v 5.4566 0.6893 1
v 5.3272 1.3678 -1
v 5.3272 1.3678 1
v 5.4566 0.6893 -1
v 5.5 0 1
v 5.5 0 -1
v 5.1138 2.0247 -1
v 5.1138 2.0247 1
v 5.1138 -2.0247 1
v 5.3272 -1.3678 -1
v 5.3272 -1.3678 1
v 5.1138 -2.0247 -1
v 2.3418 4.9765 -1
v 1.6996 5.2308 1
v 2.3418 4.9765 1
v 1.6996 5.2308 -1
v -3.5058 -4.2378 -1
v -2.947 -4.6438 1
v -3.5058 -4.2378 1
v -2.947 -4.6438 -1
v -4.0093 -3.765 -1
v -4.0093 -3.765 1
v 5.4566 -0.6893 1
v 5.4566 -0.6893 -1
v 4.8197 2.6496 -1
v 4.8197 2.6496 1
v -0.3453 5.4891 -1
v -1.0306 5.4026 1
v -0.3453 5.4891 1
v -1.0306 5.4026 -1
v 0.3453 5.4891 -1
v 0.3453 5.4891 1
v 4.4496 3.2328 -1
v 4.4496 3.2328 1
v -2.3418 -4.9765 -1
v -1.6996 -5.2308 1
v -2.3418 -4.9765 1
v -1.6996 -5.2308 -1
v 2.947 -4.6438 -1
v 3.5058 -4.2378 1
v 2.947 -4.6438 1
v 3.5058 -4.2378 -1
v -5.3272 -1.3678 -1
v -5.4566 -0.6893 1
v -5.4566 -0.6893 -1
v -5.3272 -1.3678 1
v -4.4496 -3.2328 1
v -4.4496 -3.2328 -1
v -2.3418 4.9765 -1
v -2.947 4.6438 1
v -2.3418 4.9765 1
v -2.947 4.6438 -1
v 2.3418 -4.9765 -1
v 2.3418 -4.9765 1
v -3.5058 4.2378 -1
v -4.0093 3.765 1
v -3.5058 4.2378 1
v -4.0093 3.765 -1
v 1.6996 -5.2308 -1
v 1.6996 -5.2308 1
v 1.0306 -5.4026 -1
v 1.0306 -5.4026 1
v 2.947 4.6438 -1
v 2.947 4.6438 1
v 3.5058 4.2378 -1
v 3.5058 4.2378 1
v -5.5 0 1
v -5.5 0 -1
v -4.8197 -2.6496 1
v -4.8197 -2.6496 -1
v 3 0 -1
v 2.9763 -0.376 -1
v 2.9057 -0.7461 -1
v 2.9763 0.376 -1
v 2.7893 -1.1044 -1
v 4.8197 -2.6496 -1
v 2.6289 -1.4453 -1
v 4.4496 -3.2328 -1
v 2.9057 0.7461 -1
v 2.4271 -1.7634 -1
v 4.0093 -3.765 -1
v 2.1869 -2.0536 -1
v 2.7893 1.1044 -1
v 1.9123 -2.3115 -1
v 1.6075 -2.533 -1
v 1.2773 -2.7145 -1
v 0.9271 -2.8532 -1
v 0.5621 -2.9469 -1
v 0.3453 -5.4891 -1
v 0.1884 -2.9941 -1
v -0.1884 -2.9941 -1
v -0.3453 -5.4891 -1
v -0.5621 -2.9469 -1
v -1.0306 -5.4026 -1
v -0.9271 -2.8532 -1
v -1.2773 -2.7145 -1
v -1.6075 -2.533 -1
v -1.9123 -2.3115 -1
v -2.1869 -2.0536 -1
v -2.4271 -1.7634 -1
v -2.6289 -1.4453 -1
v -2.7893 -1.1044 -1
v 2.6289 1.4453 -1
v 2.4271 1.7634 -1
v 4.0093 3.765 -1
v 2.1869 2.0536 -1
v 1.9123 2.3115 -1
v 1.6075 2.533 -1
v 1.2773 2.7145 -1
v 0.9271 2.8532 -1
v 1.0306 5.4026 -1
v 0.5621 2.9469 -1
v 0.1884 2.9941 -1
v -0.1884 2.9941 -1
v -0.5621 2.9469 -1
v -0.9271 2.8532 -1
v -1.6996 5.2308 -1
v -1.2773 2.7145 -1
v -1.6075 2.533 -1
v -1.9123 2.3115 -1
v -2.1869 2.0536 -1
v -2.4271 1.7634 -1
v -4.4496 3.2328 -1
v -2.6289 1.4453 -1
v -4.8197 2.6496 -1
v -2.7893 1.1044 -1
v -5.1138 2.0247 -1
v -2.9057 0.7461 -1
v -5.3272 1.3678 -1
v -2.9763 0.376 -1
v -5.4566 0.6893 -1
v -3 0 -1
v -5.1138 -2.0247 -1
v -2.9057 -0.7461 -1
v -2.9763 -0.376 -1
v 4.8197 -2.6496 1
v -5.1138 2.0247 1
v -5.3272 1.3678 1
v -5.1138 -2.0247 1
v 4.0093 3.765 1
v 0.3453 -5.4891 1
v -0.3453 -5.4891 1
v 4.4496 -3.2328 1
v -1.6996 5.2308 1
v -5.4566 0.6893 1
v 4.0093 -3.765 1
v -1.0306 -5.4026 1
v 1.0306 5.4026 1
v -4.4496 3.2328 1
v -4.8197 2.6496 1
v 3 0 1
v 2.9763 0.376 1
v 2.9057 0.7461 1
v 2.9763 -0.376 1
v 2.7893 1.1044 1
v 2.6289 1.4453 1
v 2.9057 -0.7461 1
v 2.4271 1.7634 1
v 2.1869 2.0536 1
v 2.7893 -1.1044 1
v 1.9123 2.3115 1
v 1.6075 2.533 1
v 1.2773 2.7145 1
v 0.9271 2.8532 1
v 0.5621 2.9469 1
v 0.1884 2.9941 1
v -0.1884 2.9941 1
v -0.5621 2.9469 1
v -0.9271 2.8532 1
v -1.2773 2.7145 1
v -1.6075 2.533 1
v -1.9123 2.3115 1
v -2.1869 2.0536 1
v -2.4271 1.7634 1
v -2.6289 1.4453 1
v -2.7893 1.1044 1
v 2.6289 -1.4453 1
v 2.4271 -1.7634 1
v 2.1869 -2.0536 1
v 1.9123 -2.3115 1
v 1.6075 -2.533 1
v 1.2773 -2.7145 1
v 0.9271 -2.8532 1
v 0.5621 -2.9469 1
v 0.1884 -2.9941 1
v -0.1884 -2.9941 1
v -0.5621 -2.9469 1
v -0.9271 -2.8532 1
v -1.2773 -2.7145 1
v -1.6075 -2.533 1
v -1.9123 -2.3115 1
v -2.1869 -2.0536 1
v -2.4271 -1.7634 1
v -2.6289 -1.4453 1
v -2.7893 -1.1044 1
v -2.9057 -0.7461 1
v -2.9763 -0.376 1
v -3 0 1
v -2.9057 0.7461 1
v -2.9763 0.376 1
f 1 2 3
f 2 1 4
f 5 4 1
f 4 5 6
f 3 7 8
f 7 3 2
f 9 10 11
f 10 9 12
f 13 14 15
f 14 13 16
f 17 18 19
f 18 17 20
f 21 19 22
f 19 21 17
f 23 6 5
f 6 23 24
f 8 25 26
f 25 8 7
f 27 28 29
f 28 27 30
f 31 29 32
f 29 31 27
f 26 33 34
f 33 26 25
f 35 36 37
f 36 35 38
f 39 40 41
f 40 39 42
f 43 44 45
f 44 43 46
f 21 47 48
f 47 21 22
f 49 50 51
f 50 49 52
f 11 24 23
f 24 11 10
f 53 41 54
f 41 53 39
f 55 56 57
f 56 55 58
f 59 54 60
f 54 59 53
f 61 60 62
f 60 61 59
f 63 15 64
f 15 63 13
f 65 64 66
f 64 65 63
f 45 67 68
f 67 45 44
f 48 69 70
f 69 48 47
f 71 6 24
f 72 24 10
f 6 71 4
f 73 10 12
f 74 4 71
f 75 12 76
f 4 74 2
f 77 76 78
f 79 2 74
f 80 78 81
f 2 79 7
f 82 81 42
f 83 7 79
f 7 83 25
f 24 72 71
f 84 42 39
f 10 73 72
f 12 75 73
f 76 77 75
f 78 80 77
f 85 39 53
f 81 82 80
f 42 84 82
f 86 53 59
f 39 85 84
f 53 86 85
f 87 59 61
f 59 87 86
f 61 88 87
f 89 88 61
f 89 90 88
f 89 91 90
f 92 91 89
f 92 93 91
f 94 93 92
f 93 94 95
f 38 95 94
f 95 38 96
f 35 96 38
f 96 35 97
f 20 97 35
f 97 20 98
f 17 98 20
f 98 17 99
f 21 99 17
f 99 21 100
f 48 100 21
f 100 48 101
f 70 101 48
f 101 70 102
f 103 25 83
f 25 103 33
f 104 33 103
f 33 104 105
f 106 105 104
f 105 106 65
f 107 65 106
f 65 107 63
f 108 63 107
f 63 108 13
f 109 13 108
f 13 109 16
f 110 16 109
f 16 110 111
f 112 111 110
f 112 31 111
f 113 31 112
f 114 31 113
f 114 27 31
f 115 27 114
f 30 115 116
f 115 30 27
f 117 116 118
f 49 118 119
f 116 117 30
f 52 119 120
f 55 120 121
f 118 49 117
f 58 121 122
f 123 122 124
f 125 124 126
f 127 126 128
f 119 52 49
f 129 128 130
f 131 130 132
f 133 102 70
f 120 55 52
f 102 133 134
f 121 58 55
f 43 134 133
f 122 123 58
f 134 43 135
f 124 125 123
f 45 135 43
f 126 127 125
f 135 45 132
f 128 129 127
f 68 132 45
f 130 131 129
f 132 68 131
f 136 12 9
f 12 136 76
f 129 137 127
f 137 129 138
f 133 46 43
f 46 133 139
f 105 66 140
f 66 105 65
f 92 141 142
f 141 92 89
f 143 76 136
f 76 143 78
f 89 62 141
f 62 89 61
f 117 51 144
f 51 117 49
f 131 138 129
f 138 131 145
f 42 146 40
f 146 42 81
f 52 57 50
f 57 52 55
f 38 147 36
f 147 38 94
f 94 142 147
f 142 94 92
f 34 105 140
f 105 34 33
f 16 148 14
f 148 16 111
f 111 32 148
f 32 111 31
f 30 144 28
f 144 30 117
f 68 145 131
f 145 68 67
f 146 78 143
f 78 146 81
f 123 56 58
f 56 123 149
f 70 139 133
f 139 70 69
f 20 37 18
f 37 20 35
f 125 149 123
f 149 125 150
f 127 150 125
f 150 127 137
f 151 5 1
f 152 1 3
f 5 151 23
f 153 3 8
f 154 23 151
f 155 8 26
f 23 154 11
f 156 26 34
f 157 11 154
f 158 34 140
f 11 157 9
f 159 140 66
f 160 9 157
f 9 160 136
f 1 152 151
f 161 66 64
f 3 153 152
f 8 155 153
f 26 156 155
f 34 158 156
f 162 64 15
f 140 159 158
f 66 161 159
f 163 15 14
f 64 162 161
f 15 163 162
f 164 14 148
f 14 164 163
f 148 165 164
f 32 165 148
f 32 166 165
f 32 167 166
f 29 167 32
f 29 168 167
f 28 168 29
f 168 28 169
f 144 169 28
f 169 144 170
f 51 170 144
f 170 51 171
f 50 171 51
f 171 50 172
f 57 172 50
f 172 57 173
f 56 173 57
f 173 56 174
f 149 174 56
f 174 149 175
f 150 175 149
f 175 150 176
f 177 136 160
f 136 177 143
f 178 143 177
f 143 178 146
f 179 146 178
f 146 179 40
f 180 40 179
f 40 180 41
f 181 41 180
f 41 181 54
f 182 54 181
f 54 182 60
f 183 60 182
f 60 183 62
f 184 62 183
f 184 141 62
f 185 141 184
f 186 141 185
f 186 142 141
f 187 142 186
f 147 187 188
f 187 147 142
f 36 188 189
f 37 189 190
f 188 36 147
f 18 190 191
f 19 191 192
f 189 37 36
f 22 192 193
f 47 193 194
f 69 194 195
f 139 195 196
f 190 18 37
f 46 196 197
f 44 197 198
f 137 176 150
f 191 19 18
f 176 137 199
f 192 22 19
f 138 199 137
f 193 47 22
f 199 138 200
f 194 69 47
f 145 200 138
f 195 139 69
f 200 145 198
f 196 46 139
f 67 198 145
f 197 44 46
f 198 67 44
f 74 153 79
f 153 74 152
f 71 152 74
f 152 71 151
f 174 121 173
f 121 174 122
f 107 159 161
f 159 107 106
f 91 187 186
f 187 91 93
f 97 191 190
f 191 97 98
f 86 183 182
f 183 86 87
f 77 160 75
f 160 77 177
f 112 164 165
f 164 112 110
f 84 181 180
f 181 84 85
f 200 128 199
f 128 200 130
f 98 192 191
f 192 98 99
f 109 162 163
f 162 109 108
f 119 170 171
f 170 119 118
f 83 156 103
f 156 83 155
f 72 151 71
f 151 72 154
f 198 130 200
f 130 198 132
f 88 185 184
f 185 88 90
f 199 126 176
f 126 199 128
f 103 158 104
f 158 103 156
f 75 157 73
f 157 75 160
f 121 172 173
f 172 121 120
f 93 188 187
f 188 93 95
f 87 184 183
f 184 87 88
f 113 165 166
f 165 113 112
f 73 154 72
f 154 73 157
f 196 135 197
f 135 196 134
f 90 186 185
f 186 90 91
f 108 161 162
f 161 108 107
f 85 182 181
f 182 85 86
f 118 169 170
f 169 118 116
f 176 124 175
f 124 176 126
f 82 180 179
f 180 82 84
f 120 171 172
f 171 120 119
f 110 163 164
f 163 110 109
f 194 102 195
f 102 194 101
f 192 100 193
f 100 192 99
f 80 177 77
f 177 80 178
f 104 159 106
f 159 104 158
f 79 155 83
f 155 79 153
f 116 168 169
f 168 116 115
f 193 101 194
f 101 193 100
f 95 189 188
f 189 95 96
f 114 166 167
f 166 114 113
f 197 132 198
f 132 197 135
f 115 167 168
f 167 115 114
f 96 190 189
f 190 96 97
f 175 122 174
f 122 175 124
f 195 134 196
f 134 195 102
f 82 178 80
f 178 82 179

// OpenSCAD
$fn = 50;


difference() {
	union() {
		translate(v = [0, 0, -1.0000000000]) {
			cylinder(h = 2, r = 5.5000000000);
		}
	}
	union() {
		translate(v = [0, 0, -100.0000000000]) {
			cylinder(h = 200, r = 3.0000000000);
		}
	}
}
